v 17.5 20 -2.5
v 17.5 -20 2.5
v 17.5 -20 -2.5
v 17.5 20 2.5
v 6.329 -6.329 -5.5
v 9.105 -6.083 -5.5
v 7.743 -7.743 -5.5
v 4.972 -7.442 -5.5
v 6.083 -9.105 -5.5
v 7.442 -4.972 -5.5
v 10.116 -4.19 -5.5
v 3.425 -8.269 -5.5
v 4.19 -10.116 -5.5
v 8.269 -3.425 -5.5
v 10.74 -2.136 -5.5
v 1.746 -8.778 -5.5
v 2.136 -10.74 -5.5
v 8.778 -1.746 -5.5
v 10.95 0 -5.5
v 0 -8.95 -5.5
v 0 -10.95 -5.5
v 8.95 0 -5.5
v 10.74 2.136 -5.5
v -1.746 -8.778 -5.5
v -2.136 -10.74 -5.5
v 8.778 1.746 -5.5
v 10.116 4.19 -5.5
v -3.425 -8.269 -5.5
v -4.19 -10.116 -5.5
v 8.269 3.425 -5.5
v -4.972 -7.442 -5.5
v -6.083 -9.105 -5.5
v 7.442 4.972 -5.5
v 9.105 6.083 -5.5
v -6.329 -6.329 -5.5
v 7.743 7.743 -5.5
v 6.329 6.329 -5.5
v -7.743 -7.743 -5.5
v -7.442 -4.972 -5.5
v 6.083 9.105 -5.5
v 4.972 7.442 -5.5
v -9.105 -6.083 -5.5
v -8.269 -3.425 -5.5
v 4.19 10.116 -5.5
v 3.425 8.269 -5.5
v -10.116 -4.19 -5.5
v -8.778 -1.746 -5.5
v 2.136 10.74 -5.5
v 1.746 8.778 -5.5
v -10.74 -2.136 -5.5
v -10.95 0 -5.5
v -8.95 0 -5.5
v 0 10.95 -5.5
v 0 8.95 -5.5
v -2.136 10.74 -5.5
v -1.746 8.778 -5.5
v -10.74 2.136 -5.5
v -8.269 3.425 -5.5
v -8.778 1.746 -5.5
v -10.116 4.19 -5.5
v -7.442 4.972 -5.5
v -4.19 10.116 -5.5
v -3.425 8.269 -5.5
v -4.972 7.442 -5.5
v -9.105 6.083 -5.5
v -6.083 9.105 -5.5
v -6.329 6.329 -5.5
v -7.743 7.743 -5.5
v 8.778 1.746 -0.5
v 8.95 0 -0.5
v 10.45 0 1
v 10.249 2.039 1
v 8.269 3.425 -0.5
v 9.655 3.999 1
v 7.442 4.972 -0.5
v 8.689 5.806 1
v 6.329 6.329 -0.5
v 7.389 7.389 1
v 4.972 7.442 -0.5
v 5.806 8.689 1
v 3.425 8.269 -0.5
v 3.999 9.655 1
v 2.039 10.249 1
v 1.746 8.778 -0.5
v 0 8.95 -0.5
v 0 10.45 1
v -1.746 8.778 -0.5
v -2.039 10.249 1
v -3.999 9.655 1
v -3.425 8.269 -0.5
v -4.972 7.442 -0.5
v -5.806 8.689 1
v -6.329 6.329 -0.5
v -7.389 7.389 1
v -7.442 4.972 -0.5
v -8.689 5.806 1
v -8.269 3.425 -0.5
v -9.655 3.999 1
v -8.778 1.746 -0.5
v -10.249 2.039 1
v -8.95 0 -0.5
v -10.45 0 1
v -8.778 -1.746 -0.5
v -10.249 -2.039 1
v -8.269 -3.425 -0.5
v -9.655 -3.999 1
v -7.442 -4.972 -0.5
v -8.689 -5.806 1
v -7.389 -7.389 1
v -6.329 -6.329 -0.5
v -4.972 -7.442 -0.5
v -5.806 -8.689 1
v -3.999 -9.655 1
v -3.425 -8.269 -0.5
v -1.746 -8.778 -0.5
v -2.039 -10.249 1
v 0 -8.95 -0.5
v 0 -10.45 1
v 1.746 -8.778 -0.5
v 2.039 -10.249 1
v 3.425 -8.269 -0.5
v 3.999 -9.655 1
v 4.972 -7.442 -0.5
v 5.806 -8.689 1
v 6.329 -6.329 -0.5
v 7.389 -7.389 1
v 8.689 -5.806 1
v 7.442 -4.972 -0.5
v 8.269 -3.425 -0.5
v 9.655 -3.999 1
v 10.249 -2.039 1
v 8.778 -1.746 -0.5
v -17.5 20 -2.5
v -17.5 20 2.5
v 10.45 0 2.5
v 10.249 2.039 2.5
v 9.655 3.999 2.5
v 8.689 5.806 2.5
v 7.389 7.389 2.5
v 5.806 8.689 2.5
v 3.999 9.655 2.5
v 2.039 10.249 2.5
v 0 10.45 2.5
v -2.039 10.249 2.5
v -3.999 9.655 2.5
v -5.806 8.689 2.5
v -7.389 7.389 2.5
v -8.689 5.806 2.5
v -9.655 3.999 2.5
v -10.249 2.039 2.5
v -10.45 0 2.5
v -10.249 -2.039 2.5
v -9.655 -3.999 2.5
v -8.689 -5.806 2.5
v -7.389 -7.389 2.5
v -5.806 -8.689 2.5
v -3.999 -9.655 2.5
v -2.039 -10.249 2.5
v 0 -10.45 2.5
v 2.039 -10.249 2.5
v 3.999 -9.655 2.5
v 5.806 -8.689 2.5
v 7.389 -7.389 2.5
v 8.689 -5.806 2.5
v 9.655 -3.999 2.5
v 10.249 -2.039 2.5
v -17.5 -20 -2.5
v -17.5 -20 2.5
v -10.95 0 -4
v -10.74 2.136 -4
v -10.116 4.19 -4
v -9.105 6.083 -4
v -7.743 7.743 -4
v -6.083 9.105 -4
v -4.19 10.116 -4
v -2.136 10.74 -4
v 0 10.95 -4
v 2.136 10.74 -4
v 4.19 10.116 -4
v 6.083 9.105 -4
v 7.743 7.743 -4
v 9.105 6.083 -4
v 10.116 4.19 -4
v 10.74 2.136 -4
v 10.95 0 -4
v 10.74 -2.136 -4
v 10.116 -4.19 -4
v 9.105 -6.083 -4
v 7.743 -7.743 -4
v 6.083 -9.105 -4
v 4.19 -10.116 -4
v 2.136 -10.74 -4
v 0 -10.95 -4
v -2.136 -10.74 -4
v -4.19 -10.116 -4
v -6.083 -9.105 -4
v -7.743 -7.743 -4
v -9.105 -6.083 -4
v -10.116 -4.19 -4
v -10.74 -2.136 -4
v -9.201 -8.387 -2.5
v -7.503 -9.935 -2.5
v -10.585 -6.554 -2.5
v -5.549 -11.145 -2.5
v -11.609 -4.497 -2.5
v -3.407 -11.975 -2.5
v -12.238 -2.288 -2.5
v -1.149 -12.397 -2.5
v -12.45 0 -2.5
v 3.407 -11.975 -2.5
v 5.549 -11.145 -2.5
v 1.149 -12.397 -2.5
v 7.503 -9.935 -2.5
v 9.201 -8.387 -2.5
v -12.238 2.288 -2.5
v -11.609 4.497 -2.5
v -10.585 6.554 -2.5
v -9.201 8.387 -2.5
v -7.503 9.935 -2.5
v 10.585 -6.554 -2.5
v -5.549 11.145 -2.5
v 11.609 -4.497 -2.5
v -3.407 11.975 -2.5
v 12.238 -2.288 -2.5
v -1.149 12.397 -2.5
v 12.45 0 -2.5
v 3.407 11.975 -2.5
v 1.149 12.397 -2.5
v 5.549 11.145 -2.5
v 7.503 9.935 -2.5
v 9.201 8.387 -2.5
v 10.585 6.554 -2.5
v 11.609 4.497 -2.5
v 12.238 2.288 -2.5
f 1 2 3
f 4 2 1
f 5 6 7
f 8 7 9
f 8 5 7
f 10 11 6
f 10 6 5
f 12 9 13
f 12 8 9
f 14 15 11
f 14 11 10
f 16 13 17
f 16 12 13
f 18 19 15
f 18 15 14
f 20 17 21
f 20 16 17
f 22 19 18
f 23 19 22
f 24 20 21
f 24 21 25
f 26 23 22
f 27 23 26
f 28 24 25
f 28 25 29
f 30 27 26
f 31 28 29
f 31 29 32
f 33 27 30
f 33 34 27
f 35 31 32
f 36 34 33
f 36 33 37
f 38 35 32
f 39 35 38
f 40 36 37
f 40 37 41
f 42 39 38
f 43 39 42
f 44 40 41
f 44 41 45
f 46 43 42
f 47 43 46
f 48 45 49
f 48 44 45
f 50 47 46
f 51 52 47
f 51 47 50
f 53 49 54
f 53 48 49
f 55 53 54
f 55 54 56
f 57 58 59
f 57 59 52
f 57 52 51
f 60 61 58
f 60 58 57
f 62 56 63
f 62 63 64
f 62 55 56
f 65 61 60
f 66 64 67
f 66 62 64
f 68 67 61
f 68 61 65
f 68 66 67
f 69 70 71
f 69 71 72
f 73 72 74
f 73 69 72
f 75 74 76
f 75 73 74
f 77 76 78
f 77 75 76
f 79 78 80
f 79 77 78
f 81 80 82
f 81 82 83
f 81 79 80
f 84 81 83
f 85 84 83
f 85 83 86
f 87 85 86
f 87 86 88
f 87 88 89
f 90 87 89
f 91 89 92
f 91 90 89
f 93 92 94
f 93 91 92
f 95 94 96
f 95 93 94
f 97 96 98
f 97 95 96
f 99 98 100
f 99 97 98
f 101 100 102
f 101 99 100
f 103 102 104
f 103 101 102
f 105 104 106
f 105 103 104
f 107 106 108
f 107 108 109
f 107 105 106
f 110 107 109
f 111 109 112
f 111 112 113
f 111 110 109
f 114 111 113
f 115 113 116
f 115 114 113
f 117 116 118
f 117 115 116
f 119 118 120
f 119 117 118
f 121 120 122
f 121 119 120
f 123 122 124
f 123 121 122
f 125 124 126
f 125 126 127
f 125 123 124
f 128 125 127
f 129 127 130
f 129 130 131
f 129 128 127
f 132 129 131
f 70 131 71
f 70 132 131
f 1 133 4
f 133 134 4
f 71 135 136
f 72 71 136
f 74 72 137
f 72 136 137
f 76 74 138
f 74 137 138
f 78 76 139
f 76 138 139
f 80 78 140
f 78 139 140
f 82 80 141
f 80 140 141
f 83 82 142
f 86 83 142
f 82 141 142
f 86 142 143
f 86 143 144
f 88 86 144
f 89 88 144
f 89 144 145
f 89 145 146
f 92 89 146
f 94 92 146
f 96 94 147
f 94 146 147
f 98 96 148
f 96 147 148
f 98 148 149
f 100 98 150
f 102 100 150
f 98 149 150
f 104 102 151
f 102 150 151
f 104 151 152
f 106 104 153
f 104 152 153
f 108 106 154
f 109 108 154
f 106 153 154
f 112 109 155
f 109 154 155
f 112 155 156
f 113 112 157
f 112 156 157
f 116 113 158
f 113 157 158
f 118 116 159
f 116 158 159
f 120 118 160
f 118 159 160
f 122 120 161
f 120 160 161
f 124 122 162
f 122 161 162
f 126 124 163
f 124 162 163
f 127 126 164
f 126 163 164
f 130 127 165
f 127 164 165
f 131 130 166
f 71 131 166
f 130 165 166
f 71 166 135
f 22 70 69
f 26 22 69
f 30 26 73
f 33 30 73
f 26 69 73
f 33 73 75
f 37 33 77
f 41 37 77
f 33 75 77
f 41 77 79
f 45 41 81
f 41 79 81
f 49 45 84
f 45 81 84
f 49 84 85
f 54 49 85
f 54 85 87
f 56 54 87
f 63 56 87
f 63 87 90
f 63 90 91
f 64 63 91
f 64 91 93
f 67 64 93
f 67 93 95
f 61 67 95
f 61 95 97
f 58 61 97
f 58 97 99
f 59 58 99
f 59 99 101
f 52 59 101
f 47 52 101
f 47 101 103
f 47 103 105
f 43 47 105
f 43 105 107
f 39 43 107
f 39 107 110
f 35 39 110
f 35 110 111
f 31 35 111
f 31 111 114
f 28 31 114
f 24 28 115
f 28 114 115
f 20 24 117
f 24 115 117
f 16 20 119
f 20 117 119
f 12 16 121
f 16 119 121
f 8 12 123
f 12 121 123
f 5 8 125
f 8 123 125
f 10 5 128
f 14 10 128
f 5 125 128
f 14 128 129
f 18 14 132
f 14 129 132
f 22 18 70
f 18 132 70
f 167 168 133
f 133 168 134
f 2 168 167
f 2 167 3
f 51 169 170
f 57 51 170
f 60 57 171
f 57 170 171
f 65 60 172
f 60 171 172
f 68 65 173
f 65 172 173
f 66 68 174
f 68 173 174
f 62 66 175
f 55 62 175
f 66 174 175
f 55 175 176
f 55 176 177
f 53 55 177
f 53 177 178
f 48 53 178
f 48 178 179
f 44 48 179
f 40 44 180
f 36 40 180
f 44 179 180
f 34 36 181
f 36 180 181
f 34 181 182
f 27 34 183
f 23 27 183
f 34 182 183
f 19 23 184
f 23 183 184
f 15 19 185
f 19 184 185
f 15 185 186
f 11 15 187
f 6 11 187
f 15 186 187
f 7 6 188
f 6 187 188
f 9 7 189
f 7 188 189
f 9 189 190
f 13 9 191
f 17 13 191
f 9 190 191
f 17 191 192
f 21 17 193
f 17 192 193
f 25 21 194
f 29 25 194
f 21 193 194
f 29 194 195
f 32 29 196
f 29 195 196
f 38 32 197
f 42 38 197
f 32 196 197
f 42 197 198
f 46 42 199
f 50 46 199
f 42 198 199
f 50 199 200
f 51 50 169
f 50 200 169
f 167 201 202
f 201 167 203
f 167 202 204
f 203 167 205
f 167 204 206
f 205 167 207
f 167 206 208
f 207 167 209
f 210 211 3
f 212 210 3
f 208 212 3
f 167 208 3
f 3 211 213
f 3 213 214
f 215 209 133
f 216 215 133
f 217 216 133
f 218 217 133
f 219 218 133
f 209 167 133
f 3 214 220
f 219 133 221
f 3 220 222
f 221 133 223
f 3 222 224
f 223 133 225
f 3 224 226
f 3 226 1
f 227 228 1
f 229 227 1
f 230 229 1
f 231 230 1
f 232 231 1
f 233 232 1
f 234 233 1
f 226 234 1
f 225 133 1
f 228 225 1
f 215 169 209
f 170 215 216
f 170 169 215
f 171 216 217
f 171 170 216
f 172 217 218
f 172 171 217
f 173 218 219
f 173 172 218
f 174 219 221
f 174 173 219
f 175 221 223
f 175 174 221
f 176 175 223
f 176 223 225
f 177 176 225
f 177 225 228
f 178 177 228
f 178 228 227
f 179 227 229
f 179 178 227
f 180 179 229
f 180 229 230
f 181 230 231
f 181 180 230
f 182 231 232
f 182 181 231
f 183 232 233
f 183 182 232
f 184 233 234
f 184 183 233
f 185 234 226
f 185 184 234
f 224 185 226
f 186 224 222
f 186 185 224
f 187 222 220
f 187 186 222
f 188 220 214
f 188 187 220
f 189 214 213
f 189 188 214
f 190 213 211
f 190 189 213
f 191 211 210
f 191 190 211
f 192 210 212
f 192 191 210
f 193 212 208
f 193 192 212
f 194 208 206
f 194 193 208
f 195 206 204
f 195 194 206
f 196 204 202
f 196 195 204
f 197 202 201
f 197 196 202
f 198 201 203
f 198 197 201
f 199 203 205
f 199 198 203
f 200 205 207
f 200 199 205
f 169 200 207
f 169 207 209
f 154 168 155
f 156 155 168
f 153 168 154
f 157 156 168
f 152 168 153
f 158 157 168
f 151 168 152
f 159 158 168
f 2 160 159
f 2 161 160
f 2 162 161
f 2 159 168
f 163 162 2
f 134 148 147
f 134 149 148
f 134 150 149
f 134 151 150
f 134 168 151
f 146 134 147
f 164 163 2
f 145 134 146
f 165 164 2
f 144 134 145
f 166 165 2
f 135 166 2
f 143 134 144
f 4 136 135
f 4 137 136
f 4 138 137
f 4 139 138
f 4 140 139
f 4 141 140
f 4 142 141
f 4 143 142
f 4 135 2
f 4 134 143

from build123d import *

# Parameters (mm, degrees)
SKETCH1_W           = 35
SKETCH1_H           = 40
BOSS_EXTRUDE1_DEPTH = 2.5
SKETCH5_R           = 10.95
BOSS_EXTRUDE2_DEPTH = 3
SKETCH2_R           = 8.95
CUT_EXTRUDE1_DEPTH  = 28.753378173
SKETCH6_R           = 10.45
CUT_EXTRUDE2_DEPTH  = 3
CHAMFER2_SIZE       = 1.5


with BuildPart() as part:
    # Sketch1 → Boss-Extrude1 (new, symmetric)
    with BuildSketch(Plane.XY):
        Rectangle(SKETCH1_W, SKETCH1_H)
    extrude(amount=BOSS_EXTRUDE1_DEPTH, both=True)

    # Sketch5 → Boss-Extrude2 (add)
    with BuildSketch(Plane(origin=(0, 0, -2.5), x_dir=(-1, 0, 0), z_dir=(0, 0, -1))):
        Circle(SKETCH5_R)
    extrude(amount=BOSS_EXTRUDE2_DEPTH)

    # Sketch2 → Cut-Extrude1 (cut, through all)
    with BuildSketch(Plane.XY.offset(2.5)):
        Circle(SKETCH2_R)
    extrude(amount=-CUT_EXTRUDE1_DEPTH, mode=Mode.SUBTRACT)

    # Sketch6 → Cut-Extrude2 (cut)
    with BuildSketch(Plane.XY.offset(2.5)):
        Circle(SKETCH6_R)
    extrude(amount=-CUT_EXTRUDE2_DEPTH, mode=Mode.SUBTRACT)

    # Chamfer2
    chamfer2_edges = [part.edges().sort_by_distance(p)[0] for p in [
        (10.95, 0, -2.5),
        (-10.45, 0, -0.5),
    ]]
    chamfer(chamfer2_edges, length=CHAMFER2_SIZE - 0.0001)  # a hair under: the kernel refuses the full size


solid = part.part
